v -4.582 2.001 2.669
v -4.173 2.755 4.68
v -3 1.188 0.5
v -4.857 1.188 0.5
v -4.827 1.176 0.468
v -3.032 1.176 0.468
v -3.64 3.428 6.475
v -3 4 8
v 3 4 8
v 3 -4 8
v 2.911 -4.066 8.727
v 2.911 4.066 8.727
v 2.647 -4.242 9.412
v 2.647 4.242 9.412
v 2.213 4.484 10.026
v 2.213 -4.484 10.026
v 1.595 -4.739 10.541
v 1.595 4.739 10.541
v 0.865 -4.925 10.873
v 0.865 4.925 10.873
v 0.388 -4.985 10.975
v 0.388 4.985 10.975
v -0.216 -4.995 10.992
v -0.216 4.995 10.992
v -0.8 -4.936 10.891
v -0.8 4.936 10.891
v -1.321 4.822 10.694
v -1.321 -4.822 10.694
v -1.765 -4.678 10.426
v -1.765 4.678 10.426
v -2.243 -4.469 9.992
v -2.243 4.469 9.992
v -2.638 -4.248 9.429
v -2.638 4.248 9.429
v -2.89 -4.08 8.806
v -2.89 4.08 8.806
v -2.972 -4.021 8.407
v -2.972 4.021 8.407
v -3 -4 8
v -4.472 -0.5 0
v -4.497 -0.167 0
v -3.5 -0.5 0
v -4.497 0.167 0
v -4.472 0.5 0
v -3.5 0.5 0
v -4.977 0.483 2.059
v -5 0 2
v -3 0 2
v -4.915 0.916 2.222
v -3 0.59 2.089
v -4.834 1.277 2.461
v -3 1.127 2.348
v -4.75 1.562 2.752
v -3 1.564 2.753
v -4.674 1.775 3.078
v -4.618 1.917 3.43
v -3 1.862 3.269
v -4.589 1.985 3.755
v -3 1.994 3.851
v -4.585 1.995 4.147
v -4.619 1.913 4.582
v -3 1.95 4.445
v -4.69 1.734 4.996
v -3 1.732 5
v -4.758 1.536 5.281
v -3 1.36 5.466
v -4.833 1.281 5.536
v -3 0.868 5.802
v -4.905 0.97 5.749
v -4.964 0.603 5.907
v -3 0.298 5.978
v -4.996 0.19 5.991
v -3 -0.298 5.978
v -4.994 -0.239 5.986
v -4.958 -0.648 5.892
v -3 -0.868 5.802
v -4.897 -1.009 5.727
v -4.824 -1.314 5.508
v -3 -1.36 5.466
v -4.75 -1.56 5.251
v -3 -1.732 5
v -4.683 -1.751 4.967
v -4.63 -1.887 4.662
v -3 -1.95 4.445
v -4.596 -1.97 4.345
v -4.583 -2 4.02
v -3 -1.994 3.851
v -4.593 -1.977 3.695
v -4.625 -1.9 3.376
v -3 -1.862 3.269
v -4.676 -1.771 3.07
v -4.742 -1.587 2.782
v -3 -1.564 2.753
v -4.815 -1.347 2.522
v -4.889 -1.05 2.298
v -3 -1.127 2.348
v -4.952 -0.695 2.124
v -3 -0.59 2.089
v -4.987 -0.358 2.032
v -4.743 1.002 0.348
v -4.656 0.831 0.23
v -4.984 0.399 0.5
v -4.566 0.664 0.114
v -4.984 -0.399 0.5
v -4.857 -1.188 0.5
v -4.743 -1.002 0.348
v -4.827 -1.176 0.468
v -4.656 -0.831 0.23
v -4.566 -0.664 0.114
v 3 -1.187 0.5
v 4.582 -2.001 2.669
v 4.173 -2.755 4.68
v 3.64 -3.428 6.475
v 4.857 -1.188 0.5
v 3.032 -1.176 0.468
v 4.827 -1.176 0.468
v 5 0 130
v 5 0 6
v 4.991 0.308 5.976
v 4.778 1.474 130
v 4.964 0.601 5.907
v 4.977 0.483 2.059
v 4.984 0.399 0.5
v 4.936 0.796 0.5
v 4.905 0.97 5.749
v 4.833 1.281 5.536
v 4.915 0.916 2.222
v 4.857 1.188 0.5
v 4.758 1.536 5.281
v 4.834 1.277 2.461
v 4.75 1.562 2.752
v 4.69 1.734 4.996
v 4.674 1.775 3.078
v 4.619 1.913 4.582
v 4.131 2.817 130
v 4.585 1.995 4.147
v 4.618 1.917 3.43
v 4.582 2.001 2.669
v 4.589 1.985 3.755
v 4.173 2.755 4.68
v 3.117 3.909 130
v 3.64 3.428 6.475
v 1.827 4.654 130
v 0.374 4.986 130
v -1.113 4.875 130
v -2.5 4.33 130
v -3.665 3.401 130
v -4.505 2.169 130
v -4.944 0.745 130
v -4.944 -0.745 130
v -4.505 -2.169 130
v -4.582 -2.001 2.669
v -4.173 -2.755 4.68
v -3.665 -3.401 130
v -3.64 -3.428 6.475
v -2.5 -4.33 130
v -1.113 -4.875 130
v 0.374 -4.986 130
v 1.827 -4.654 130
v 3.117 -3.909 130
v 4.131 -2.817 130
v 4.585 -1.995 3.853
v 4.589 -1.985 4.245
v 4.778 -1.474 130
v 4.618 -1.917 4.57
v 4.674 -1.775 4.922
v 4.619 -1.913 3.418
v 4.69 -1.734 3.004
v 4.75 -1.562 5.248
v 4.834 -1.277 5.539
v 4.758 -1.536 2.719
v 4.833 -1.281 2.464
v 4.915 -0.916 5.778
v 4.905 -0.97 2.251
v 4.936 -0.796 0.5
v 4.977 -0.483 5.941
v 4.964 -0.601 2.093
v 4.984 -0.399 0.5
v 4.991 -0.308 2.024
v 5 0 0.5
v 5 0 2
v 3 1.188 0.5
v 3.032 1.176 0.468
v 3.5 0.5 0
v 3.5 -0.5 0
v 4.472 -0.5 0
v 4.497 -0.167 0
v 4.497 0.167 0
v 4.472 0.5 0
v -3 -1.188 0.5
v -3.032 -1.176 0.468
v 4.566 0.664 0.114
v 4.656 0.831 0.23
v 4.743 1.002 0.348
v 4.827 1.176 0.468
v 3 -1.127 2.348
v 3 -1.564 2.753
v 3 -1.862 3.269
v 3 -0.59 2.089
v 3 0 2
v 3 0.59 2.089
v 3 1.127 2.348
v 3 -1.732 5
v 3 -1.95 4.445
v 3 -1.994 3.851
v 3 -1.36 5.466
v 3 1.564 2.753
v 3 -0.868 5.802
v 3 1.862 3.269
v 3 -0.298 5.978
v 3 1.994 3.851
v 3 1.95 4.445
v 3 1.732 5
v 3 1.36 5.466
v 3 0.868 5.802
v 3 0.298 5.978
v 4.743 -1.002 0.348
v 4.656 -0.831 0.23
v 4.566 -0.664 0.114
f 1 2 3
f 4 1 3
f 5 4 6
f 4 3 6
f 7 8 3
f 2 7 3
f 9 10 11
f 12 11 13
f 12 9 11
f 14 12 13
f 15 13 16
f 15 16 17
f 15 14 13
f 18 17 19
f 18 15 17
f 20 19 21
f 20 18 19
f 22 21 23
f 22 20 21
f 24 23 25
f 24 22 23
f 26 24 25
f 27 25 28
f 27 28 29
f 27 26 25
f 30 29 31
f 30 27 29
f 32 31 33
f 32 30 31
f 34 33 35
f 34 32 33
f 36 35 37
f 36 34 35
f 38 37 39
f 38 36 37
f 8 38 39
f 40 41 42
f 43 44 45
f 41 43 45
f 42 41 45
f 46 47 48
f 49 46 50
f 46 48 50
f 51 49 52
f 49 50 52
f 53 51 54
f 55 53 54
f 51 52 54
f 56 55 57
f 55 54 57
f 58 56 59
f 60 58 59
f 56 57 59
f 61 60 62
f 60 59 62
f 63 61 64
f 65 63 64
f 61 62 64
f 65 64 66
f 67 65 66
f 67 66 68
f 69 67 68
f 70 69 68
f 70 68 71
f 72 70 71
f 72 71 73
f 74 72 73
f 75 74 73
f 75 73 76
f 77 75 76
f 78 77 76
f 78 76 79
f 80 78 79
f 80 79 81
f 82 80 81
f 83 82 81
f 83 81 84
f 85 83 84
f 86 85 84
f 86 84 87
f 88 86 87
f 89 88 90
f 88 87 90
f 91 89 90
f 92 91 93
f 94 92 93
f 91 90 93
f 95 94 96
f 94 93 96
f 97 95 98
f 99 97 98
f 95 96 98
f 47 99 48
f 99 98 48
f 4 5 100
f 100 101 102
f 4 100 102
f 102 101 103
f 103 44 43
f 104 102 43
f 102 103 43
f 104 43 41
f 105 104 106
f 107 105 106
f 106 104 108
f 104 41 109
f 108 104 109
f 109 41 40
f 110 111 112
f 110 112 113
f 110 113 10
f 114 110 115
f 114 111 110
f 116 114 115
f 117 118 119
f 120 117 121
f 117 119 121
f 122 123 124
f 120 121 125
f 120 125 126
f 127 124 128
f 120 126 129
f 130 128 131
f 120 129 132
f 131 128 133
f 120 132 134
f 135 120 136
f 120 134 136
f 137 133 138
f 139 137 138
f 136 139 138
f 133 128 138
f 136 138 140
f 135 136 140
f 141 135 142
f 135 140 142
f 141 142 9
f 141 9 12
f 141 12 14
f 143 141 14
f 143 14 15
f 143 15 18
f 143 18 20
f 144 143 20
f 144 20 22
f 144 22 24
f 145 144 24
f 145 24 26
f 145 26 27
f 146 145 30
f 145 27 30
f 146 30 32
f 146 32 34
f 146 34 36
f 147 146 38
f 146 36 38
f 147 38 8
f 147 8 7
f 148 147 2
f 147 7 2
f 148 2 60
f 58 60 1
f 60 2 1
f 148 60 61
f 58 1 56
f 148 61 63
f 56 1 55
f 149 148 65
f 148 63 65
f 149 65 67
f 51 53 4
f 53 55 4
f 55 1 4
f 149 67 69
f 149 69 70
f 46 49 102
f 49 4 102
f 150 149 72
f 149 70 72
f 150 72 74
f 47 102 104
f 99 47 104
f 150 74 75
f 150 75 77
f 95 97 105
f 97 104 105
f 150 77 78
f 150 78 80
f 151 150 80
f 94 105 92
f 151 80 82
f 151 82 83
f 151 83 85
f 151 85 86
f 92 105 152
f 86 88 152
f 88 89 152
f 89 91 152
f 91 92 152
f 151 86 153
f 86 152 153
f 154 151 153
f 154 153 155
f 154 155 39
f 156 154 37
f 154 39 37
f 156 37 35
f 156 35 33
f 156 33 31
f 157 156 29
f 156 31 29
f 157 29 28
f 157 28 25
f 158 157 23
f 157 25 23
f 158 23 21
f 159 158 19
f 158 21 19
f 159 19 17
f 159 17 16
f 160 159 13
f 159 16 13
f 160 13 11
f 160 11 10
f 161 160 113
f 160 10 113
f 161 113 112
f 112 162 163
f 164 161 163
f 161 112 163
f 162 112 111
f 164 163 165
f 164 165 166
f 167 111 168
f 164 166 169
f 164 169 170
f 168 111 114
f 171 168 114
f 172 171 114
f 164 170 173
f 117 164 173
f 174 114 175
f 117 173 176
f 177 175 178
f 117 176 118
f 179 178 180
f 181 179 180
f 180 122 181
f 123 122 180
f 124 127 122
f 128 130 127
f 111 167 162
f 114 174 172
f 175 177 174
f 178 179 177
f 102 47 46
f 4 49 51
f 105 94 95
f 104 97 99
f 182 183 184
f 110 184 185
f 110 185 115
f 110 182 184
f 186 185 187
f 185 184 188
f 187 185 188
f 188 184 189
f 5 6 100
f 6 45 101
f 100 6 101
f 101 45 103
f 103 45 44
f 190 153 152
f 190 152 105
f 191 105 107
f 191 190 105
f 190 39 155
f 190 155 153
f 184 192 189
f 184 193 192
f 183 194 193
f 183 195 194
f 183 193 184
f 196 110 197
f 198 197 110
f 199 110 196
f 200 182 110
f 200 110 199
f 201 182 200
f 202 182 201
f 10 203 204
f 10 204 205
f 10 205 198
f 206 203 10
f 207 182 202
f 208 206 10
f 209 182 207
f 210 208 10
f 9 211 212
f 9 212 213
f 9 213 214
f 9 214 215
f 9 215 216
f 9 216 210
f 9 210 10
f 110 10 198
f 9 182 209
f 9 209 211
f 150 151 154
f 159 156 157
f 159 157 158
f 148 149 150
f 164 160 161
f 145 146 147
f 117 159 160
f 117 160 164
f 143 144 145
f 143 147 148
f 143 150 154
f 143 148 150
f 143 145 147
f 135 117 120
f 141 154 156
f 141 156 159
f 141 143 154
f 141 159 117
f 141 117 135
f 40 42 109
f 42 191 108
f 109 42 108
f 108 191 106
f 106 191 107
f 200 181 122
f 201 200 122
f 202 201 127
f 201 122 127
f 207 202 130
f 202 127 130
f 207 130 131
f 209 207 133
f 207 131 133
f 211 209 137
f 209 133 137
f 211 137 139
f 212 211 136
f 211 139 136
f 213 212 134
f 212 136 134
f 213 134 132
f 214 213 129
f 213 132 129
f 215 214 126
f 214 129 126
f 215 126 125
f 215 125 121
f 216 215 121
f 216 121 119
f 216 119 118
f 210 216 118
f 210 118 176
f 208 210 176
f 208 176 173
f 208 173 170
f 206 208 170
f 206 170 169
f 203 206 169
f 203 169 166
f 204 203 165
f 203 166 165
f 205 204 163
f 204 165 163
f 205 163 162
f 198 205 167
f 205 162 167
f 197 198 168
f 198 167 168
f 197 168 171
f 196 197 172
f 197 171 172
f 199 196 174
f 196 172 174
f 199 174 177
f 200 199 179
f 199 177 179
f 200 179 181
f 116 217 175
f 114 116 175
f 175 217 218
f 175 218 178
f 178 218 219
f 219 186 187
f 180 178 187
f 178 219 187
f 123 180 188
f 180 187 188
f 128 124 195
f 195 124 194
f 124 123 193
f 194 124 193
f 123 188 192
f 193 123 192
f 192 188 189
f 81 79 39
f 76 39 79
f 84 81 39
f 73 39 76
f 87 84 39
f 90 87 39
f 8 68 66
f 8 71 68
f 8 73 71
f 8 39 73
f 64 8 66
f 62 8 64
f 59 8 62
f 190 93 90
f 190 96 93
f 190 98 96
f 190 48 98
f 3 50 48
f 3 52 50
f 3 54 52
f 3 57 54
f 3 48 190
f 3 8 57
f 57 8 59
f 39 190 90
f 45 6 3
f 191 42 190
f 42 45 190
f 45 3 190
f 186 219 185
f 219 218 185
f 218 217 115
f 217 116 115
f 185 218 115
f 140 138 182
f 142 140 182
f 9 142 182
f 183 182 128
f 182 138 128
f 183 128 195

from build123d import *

# Parameters (mm, degrees)
SKETCH1_R           = 5
BOSS_EXTRUDE1_DEPTH = 130
CUT_EXTRUDE1_DEPTH  = 131.479883507
SKETCH3_R           = 2
CUT_EXTRUDE2_DEPTH  = 131.479883618
CHAMFER1_SIZE       = 0.5


with BuildPart() as part:
    # Sketch1 → Boss-Extrude1 (new body)
    with BuildSketch(Plane.XY):
        Circle(SKETCH1_R)
    extrude(amount=BOSS_EXTRUDE1_DEPTH)

    # Sketch2 → Cut-Extrude1 (cut, through all)
    with BuildSketch(Plane(origin=(0, 5, 0), x_dir=(1, 0, 0), z_dir=(0, 1, 0))):
        with BuildLine():
            Line((-3, 0), (3, 0))
            Line((3, 0), (3, -8))
            ThreePointArc((3, -8), (0, -11), (-3, -8))
            Line((-3, -8), (-3, 0))
        make_face()
    extrude(amount=-CUT_EXTRUDE1_DEPTH, mode=Mode.SUBTRACT)

    # Sketch3 → Cut-Extrude2 (cut, through all)
    with BuildSketch(Plane(origin=(5, 0, 0), x_dir=(0, 0, -1), z_dir=(1, 0, 0))):
        with Locations((-4, 0)):
            Circle(SKETCH3_R)
        Polygon((-8, -4), (0, -1), (0, -4), align=None)
        Polygon((0, 1), (0, 4), (-8, 4), align=None)
    extrude(amount=-CUT_EXTRUDE2_DEPTH, mode=Mode.SUBTRACT)

    # Chamfer1
    chamfer1_edges = [part.edges().sort_by_distance(p)[0] for p in [
        (-3.949489743, -1, 0),
        (-5, 0, 0),
        (4.974680765, -0.50254481, 0),
        (-3.949489743, 1, 0),
        (-3, 0, 0),
        (3, 0, 0),
        (3.949489743, -1, 0),
        (3.949489743, 1, 0),
    ]]
    chamfer(chamfer1_edges, length=CHAMFER1_SIZE)


solid = part.part
